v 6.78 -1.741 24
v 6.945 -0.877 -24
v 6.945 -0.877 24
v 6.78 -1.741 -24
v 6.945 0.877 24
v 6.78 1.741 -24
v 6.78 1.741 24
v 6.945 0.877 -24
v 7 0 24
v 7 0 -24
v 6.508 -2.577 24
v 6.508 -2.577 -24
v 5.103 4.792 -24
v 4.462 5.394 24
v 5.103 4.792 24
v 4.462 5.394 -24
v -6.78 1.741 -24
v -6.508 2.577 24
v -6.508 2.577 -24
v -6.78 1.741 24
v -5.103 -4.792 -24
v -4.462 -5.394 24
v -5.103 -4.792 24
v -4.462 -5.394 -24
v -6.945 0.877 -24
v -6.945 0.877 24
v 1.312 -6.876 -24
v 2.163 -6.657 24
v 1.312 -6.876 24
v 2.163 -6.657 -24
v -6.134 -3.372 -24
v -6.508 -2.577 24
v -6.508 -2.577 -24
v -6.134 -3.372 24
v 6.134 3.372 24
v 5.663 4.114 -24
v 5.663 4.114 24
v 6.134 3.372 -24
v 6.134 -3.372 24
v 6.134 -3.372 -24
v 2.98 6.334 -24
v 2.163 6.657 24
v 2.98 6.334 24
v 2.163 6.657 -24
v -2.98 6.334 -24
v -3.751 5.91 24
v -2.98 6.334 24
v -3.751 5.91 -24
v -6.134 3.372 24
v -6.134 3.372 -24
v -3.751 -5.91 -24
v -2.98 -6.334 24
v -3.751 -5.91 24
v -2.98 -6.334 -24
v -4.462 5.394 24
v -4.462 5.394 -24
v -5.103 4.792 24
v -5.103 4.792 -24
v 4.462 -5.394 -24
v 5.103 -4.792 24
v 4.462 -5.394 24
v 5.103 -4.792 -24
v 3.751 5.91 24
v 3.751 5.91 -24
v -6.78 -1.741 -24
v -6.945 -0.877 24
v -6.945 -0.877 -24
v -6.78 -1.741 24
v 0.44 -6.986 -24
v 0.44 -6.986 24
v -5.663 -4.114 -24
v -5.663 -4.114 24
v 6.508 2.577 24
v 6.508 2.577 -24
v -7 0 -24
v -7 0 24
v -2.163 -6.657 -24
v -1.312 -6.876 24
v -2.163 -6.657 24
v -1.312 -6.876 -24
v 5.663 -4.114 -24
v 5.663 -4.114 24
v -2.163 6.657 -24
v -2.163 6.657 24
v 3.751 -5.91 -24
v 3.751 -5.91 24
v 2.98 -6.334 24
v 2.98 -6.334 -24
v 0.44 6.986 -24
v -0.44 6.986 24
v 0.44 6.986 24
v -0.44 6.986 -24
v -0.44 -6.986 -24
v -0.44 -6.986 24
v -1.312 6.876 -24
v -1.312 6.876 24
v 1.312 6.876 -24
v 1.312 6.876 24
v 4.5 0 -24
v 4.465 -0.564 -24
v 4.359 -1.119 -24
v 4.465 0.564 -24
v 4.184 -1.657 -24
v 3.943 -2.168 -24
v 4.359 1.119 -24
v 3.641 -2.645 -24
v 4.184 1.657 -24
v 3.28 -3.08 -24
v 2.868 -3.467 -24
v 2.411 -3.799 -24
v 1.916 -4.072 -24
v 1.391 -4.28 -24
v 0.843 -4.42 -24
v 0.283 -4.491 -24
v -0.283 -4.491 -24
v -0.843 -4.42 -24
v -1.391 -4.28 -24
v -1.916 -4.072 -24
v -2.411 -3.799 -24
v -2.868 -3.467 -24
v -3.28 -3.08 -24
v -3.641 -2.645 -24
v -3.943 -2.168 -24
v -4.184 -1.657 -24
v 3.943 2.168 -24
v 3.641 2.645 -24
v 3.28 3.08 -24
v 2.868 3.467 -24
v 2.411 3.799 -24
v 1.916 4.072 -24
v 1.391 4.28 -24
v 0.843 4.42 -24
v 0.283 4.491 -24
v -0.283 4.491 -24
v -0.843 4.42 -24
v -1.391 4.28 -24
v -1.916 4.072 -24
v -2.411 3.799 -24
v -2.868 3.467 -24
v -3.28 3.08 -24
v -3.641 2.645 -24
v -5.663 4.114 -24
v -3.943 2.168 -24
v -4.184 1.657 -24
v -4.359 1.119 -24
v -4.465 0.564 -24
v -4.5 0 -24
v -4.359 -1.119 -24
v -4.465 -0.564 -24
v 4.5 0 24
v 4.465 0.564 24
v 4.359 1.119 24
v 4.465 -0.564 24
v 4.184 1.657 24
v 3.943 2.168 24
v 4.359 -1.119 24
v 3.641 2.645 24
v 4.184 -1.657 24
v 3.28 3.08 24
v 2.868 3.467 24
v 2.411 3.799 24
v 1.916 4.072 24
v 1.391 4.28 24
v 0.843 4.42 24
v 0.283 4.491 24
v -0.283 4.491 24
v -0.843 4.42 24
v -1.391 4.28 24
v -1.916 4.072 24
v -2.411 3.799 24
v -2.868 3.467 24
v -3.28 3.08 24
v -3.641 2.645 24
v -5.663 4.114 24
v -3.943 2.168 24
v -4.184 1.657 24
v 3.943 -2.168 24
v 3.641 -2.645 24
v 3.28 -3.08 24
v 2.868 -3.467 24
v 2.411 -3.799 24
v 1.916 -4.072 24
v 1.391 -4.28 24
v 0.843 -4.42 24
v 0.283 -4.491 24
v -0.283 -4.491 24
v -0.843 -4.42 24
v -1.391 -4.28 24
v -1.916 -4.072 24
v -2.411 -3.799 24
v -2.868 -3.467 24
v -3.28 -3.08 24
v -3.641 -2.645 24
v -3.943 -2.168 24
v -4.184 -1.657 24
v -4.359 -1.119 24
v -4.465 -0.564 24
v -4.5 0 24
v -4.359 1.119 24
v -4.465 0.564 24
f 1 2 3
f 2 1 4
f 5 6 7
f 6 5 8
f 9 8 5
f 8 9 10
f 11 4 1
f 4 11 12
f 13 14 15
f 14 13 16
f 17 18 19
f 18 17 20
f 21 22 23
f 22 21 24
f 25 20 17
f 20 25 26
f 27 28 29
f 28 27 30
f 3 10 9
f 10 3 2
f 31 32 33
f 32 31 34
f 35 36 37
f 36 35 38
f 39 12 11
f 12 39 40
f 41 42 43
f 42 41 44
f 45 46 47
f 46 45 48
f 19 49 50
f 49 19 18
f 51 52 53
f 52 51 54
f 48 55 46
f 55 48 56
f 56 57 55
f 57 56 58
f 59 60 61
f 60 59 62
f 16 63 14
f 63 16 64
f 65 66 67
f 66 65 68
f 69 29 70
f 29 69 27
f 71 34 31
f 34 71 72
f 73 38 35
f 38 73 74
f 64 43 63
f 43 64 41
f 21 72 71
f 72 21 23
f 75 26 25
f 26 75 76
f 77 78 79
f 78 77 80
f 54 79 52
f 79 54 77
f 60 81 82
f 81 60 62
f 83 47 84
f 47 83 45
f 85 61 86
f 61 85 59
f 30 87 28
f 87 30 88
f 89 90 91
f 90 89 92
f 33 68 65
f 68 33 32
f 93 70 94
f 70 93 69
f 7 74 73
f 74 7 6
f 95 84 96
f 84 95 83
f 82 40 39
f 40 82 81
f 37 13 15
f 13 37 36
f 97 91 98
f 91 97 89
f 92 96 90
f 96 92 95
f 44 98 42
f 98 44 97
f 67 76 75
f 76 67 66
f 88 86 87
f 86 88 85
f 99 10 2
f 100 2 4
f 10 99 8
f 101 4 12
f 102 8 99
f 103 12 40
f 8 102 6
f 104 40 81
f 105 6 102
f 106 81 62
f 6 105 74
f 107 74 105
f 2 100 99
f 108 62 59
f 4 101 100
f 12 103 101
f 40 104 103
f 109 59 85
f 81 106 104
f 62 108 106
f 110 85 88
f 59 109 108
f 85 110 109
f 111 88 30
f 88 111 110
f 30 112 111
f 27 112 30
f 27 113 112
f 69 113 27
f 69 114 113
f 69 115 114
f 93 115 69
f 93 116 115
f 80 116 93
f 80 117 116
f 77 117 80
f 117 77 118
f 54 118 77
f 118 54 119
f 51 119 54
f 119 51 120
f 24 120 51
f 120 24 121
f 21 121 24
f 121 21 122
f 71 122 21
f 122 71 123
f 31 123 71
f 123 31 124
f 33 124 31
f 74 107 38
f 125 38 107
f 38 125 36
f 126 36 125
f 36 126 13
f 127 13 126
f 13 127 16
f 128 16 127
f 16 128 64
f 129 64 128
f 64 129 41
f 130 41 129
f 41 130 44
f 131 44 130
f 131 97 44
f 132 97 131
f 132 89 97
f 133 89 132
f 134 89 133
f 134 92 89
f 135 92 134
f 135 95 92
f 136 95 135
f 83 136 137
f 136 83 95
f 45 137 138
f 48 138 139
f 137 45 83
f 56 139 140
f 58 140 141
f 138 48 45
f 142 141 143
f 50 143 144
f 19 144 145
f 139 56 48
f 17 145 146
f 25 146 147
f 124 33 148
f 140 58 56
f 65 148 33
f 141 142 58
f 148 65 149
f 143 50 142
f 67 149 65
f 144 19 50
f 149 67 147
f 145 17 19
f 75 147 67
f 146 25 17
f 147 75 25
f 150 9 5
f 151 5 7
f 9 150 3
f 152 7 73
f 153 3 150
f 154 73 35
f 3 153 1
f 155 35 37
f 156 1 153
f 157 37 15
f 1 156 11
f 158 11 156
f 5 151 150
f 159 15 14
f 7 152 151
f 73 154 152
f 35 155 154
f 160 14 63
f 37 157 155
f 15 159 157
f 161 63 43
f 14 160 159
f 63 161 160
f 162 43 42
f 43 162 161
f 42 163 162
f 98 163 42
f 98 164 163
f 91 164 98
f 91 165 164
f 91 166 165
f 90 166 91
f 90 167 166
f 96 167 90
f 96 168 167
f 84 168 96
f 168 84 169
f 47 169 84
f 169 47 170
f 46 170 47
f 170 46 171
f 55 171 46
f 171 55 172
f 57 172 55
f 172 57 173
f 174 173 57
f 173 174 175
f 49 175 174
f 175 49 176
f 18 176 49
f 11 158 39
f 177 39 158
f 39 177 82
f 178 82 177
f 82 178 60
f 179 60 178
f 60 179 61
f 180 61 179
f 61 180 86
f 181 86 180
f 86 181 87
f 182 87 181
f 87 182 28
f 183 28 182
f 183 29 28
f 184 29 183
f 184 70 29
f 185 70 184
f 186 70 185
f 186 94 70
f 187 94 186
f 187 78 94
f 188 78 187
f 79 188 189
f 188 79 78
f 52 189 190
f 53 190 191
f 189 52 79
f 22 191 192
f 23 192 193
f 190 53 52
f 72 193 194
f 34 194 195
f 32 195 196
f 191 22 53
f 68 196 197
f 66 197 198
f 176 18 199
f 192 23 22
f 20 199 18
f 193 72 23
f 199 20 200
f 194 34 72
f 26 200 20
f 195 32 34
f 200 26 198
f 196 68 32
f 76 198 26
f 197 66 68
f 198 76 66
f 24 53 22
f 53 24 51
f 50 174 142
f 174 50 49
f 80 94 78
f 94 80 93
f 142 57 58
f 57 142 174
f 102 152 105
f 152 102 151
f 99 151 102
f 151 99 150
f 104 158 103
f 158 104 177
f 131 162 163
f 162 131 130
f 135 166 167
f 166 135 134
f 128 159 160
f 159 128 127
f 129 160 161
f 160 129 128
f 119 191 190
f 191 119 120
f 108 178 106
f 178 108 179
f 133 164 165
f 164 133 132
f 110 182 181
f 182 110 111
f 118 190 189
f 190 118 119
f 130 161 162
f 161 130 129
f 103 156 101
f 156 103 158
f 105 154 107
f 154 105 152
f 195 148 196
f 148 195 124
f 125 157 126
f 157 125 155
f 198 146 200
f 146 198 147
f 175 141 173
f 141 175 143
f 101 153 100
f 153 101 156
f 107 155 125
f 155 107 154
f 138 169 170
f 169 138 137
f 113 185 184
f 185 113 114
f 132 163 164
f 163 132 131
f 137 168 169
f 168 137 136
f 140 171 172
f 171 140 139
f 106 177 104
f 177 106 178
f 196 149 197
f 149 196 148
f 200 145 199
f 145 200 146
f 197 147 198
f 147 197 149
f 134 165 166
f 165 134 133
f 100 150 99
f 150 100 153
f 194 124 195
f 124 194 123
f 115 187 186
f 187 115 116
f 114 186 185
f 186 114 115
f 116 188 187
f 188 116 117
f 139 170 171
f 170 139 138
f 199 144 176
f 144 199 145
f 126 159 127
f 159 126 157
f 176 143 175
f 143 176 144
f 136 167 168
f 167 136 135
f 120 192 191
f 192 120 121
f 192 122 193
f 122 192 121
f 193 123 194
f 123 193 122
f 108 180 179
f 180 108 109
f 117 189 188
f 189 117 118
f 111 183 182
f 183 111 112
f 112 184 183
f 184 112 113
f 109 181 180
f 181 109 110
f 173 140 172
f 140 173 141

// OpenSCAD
$fn = 50;


difference() {
	union() {
		translate(v = [0, 0, -24.0000000000]) {
			cylinder(h = 48, r = 7.0000000000);
		}
	}
	union() {
		translate(v = [0, 0, -100.0000000000]) {
			cylinder(h = 200, r = 4.5000000000);
		}
	}
}
